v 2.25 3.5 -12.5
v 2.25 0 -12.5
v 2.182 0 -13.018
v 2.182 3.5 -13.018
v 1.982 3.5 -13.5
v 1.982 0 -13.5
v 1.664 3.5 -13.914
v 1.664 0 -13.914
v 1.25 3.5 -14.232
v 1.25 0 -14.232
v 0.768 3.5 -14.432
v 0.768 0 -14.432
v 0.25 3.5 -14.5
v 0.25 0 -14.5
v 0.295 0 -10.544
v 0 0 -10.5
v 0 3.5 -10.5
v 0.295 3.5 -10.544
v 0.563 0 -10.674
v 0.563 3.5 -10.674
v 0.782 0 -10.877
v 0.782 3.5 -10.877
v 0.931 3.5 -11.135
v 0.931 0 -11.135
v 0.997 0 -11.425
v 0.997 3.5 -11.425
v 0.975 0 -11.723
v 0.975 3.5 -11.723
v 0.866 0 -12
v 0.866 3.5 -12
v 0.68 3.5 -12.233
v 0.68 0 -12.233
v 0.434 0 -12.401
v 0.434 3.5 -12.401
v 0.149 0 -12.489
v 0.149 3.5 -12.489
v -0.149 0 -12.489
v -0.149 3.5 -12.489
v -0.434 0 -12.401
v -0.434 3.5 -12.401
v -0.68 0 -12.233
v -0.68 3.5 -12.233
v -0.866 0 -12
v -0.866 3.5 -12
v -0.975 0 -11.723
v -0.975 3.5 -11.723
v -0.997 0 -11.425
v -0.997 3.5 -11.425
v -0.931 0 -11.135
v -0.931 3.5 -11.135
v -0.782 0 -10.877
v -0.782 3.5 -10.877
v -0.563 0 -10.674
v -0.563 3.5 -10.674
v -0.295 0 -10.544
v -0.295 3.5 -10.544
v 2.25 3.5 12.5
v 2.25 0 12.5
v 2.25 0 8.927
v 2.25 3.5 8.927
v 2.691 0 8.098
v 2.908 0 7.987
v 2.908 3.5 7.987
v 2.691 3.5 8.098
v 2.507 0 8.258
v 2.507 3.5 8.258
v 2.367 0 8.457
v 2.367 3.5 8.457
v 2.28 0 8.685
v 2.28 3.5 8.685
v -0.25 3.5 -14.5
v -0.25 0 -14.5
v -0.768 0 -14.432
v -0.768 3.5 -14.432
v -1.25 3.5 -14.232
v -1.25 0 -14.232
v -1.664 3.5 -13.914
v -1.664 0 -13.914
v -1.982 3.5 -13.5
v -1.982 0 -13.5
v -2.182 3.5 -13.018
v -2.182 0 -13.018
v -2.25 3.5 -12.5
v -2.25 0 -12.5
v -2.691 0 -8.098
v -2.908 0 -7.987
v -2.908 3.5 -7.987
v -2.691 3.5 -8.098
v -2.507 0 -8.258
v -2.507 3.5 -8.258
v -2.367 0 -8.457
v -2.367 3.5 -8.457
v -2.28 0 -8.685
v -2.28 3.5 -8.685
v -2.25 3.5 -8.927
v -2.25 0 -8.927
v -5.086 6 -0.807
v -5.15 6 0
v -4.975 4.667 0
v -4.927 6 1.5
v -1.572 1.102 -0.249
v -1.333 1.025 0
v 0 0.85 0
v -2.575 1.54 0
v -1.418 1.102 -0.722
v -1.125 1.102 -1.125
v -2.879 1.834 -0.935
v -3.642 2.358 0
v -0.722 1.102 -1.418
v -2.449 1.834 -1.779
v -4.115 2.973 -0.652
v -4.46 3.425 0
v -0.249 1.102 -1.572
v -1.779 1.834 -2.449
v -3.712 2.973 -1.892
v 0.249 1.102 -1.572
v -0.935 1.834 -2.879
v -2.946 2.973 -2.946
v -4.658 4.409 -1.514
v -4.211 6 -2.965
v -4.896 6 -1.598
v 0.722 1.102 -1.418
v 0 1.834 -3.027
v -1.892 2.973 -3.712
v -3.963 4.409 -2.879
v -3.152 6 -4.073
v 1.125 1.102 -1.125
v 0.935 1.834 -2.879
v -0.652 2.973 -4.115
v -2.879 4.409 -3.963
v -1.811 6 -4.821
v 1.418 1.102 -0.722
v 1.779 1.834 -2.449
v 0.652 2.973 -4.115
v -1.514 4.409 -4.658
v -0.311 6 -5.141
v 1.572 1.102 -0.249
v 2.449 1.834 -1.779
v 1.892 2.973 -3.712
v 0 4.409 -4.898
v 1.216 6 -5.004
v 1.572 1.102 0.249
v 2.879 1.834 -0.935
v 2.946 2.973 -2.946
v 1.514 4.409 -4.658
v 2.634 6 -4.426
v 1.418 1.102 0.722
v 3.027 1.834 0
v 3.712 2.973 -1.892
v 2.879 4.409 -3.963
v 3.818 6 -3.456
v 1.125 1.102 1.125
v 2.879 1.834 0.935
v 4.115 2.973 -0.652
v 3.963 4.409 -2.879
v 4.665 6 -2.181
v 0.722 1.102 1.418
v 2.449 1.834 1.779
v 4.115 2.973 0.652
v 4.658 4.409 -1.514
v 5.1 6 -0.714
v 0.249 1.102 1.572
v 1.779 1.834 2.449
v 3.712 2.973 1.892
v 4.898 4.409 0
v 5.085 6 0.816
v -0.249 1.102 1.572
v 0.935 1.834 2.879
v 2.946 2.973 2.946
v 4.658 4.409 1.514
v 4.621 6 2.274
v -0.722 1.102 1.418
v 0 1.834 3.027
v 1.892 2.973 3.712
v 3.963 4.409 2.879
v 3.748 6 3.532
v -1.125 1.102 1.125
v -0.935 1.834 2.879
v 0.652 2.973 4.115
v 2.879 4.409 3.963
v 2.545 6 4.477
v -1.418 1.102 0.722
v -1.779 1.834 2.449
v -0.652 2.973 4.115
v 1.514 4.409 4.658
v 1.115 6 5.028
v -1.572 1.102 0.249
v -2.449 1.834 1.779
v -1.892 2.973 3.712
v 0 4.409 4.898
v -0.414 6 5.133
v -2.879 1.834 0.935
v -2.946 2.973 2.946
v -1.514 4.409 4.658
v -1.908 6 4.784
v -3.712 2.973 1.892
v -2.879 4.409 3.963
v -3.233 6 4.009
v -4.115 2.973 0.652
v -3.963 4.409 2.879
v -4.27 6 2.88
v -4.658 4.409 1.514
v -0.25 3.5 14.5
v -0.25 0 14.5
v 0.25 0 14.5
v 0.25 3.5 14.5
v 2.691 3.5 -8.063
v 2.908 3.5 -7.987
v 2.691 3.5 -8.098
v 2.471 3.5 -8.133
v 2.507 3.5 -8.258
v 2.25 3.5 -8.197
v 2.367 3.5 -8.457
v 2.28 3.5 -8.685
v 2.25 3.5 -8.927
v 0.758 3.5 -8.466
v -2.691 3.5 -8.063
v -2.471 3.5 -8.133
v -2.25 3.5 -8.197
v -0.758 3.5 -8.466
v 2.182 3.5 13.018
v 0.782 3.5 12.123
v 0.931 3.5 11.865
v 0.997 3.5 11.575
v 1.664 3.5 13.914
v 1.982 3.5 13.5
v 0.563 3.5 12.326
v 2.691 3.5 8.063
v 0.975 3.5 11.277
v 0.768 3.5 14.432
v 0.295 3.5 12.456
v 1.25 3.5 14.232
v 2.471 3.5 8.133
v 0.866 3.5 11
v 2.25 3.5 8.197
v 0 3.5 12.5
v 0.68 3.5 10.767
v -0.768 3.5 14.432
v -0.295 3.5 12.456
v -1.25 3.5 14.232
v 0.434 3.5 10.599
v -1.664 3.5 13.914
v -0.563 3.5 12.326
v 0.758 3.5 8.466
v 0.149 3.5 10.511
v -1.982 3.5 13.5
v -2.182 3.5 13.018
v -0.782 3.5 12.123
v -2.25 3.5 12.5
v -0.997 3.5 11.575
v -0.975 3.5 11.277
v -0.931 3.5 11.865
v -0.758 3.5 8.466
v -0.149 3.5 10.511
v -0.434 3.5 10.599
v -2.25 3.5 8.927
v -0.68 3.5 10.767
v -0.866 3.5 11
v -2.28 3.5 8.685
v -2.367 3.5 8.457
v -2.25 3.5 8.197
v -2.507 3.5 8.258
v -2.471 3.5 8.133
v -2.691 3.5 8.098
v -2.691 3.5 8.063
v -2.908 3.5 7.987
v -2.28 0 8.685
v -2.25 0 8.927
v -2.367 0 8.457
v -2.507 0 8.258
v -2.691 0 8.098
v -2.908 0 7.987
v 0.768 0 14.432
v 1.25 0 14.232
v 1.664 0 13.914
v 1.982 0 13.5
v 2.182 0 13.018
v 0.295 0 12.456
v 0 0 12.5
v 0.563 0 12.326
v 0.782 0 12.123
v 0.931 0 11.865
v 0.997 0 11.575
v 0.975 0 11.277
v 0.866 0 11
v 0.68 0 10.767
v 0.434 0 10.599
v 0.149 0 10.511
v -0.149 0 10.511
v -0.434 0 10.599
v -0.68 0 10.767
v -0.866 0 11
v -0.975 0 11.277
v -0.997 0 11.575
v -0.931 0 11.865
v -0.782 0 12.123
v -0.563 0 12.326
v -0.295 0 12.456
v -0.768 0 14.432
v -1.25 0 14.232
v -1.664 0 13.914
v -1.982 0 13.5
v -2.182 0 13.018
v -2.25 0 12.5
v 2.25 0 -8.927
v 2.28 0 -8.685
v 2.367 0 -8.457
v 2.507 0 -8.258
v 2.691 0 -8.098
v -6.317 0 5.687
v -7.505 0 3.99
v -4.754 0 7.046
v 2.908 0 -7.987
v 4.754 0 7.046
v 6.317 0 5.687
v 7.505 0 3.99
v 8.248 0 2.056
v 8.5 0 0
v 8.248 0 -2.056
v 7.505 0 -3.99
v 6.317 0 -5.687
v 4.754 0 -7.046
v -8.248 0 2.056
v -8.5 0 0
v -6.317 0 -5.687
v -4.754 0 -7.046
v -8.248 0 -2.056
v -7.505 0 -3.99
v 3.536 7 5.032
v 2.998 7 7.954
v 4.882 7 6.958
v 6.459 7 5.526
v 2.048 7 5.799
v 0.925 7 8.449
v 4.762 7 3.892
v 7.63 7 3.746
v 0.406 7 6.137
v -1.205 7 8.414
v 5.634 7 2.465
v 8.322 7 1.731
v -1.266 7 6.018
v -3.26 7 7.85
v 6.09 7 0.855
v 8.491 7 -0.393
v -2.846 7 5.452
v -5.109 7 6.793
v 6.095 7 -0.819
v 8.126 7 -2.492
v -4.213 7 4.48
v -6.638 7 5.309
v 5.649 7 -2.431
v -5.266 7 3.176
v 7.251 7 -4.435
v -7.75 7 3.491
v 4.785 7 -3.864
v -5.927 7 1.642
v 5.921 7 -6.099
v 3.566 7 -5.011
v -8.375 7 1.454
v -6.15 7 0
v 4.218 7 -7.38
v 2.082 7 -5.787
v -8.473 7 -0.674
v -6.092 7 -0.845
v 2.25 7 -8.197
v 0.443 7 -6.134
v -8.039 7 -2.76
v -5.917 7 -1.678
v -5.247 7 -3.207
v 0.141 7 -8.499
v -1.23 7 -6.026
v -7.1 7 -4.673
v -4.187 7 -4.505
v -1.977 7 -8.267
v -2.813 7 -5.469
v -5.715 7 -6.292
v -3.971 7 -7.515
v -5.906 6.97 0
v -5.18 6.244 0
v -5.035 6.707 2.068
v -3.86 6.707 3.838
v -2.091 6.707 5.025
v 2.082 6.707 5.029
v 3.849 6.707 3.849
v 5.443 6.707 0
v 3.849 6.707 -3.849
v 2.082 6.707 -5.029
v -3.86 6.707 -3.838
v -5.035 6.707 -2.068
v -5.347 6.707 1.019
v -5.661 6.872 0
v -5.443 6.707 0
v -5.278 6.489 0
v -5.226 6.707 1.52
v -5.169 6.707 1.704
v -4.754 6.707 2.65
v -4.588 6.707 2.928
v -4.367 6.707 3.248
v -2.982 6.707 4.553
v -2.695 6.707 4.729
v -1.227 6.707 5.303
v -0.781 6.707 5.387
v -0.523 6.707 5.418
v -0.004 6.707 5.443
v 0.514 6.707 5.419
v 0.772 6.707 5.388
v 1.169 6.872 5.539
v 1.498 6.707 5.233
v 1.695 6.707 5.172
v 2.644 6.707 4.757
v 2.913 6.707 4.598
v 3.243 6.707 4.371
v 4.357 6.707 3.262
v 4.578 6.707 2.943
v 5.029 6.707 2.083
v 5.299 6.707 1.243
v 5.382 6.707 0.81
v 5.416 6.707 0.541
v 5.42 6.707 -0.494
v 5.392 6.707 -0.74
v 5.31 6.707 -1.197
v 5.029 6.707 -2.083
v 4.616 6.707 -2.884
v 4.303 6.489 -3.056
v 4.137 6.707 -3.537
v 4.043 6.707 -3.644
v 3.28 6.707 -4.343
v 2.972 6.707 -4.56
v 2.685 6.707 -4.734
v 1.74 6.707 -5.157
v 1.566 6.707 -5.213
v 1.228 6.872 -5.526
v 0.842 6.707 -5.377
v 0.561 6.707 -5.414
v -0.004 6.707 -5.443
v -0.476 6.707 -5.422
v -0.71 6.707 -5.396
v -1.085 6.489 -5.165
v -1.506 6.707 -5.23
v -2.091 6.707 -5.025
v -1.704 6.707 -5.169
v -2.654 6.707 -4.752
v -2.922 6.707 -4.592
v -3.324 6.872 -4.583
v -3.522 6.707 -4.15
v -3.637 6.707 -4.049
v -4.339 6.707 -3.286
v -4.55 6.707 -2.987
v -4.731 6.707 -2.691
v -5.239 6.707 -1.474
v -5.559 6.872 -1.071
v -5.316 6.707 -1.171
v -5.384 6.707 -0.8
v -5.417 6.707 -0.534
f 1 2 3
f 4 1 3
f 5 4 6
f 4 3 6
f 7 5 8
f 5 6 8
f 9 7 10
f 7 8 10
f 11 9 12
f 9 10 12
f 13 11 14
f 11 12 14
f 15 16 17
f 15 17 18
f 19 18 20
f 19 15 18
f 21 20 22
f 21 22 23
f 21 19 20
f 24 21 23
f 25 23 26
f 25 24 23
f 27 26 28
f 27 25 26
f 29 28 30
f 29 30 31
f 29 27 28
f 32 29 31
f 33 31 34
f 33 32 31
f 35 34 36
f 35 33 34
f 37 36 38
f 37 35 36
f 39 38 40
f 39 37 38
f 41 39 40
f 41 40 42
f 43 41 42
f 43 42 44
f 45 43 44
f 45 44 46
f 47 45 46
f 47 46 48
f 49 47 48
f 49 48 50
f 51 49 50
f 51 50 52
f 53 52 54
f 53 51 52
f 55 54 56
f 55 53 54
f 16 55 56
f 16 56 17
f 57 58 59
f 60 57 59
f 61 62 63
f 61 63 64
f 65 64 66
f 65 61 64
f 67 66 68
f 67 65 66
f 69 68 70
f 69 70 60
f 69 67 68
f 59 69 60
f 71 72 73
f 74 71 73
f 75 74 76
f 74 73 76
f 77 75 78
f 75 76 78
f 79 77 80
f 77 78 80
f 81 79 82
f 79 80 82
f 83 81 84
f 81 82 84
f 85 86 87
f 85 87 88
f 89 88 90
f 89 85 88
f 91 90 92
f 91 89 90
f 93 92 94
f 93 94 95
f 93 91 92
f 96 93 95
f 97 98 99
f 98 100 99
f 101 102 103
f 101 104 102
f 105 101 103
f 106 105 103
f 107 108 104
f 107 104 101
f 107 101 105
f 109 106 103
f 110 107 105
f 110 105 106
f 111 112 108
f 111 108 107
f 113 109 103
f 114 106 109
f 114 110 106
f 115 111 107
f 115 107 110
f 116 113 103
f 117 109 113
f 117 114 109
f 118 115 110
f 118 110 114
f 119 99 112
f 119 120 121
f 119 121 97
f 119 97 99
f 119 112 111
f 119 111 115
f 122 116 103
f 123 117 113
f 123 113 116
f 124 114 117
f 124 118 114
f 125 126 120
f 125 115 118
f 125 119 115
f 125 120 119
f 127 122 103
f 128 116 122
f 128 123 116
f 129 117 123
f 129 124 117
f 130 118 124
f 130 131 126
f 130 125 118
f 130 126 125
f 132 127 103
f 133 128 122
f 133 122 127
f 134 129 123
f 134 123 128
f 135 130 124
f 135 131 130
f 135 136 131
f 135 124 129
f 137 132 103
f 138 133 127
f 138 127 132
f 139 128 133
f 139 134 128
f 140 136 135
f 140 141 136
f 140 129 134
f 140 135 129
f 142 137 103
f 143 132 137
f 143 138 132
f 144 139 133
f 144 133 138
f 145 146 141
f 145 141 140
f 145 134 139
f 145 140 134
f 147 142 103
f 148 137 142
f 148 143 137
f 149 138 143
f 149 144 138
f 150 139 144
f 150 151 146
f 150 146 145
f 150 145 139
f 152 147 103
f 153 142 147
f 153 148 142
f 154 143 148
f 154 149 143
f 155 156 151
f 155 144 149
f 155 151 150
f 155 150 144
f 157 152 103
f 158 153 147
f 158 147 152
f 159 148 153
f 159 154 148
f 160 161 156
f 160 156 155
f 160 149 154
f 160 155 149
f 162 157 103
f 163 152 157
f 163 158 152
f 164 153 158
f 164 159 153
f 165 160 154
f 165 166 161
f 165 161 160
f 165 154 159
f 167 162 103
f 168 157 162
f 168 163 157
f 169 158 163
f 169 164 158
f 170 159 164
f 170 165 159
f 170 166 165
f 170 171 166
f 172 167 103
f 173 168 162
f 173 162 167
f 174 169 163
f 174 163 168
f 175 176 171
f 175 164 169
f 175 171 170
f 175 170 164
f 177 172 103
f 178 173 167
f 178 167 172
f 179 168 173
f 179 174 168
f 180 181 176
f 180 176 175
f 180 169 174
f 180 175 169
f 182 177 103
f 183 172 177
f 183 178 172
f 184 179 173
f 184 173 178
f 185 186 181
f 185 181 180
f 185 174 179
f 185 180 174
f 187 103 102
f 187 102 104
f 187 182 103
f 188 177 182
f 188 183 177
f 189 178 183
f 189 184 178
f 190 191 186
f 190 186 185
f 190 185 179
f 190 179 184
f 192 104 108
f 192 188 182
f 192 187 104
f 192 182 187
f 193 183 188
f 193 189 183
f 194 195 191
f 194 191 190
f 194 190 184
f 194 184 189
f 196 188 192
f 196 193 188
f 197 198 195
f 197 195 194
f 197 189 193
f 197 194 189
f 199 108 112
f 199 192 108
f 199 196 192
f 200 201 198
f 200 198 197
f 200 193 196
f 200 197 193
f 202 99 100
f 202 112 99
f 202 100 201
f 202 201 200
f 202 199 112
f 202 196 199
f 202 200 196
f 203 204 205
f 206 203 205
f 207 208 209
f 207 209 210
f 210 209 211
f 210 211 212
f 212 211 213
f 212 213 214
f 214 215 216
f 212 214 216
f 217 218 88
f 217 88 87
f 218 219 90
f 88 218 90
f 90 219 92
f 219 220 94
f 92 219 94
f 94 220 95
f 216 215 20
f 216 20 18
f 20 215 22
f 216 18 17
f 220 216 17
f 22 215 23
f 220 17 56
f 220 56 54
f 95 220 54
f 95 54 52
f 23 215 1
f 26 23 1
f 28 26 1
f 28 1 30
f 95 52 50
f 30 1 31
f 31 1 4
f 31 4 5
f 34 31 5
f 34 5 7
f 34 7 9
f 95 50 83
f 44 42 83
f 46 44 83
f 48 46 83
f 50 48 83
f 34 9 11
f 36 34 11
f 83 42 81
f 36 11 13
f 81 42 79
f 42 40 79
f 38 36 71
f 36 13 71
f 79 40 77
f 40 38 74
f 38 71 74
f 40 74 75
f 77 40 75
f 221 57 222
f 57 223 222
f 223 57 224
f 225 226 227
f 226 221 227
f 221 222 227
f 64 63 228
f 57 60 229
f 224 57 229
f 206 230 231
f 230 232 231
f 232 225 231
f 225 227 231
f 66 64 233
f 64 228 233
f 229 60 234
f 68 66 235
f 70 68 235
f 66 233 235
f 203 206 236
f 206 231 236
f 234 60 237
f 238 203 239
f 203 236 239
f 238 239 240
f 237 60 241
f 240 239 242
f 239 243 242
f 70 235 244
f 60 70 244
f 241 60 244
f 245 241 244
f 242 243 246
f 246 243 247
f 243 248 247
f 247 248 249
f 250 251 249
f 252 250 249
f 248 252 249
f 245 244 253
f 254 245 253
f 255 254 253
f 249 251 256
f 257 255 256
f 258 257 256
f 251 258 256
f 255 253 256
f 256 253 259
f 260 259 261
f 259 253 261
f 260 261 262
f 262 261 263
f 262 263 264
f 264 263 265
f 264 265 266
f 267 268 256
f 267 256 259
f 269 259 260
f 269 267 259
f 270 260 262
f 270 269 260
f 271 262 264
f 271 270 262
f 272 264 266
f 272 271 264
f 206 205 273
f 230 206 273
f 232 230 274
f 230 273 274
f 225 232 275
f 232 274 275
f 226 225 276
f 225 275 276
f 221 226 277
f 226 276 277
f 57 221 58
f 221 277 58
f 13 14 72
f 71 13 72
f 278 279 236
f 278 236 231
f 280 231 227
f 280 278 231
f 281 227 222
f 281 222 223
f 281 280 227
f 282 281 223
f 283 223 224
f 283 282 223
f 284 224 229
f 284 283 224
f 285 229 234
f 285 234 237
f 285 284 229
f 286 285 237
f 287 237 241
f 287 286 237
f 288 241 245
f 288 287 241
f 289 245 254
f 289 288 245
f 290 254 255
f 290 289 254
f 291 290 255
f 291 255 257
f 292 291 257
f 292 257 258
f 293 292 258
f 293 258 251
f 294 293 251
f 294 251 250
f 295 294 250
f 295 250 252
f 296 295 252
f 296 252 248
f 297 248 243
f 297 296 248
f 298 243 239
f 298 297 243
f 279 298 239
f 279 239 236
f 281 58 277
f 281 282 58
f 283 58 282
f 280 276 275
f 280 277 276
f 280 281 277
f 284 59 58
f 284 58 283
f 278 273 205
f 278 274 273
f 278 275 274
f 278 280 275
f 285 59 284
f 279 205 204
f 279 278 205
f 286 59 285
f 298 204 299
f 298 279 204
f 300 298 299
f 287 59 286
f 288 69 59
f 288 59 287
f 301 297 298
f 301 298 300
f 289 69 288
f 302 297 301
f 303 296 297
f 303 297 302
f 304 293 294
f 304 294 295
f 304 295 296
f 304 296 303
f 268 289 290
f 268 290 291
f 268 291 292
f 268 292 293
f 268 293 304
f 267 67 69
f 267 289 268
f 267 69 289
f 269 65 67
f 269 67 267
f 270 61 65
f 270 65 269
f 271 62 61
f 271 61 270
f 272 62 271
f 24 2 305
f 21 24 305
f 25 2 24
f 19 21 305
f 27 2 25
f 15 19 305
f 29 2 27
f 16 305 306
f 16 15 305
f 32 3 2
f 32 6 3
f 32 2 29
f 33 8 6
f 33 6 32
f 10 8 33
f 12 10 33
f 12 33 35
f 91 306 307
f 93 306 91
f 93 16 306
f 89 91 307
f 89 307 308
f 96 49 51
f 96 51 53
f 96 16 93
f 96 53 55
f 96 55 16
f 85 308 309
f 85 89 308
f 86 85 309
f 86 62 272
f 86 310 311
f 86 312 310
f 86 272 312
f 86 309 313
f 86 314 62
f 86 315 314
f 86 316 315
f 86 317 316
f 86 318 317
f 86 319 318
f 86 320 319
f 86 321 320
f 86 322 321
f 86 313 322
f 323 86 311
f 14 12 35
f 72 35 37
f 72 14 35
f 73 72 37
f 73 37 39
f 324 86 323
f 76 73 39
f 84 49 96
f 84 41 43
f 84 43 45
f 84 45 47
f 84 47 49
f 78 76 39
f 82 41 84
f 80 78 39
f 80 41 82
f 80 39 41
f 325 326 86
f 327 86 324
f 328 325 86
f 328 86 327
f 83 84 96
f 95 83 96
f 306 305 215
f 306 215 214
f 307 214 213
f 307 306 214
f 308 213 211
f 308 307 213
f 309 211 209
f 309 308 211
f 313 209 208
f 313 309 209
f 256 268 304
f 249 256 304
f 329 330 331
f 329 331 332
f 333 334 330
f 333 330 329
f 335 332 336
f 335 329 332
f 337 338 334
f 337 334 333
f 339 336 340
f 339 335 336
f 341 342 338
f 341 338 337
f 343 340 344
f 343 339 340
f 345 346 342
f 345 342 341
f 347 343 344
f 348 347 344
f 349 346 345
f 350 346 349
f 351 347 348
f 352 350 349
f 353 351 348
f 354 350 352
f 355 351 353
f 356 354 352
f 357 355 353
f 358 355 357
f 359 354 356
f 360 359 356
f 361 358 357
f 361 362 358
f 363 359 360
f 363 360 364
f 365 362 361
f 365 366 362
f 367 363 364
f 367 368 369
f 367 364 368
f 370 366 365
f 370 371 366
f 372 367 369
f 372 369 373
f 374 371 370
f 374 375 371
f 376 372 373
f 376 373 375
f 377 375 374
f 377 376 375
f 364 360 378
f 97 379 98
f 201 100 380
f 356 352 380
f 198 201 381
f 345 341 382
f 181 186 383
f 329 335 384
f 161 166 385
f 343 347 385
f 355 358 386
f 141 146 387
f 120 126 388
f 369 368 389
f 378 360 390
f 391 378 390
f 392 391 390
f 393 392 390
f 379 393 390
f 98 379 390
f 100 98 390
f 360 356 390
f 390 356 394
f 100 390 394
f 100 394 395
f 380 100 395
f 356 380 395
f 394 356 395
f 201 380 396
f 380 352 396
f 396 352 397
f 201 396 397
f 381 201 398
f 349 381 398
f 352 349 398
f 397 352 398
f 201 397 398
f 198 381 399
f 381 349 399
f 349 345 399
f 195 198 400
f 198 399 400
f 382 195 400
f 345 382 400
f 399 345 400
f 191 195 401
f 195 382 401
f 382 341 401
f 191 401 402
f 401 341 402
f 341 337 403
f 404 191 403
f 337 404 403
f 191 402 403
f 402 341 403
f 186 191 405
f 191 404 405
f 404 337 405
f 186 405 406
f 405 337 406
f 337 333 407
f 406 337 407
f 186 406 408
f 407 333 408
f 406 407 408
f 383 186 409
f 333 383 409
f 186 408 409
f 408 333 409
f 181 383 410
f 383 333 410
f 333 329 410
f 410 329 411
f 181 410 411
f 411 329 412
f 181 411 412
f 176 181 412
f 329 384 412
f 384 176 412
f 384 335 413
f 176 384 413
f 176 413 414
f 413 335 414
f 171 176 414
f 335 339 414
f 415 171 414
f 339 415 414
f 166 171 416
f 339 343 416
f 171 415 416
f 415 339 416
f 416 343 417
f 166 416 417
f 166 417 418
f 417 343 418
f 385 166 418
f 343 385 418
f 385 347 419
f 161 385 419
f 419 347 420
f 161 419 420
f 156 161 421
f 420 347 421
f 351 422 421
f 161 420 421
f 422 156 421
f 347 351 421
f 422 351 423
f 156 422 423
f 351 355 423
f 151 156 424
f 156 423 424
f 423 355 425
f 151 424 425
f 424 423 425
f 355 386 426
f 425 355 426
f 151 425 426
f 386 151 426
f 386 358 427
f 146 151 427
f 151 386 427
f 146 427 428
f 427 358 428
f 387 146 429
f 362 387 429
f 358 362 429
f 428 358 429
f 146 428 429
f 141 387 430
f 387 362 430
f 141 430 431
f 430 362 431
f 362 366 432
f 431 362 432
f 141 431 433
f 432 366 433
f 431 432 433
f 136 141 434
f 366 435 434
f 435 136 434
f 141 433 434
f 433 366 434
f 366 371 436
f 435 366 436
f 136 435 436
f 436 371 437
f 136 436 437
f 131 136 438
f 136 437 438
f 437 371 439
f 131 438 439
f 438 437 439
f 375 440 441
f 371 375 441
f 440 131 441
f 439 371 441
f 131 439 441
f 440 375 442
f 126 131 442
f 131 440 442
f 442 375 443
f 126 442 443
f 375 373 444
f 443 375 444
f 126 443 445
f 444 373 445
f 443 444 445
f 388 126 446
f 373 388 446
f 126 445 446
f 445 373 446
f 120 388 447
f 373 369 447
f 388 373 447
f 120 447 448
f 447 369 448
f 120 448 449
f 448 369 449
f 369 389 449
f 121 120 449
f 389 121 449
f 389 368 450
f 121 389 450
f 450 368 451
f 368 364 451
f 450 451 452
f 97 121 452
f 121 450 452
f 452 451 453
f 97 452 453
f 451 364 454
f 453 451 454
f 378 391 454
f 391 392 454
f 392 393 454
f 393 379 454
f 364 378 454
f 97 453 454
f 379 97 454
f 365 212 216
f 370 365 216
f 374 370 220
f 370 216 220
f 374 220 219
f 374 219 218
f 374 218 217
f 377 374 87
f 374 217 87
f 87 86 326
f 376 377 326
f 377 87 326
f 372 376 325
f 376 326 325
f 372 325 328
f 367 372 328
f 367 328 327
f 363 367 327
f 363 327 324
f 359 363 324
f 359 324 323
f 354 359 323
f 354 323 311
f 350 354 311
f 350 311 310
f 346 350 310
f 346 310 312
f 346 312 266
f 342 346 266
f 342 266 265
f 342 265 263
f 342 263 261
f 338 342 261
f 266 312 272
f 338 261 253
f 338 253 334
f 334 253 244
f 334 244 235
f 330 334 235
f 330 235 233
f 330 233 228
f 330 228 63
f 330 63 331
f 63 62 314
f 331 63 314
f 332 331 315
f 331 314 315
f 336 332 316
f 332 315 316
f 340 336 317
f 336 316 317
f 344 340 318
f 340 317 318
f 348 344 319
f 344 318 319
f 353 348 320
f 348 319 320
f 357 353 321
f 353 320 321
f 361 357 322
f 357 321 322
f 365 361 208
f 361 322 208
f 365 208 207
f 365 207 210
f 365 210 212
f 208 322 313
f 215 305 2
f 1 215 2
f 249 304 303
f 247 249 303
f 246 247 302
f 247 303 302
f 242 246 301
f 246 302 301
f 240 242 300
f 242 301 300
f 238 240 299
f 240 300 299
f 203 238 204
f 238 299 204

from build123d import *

# Parameters (mm, degrees)
CROQUIS1_R              = 1
CROQUIS1_R_2            = 8.5
SALIENTE_EXTRUIR1_DEPTH = 3.5
CROQUIS1_3_R            = 8.5
SALIENTE_EXTRUIR2_DEPTH = 7
REDONDEO1_R             = 1
REDONDEO3_R             = 1


with BuildPart() as part:
    # Croquis1 → Saliente-Extruir1 (new body)
    # profile 1 of 3: a face of its own
    with BuildSketch(Plane(origin=(0, 0, 0), x_dir=(1, 0, 0), z_dir=(0, 1, 0))):
        with BuildLine():
            Line((-2.25, 12.5), (-2.25, 8.196798155))
            ThreePointArc((-2.25, 8.196798155), (0, 8.5), (2.25, 8.196798155))
            Line((2.25, 8.196798155), (2.25, 12.5))
            ThreePointArc((2.25, 12.5), (1.664213562, 13.914213562), (0.25, 14.5))
            Line((0.25, 14.5), (-0.25, 14.5))
            ThreePointArc((-0.25, 14.5), (-1.664213562, 13.914213562), (-2.25, 12.5))
        make_face()
        with Locations(Location((0, 11.5, 0), (0, 0, 270))):
            Circle(CROQUIS1_R, mode=Mode.SUBTRACT)
    # profile 2 of 3: a face of its own
    with BuildSketch(Plane(origin=(0, 0, 0), x_dir=(1, 0, 0), z_dir=(0, 1, 0))):
        Circle(CROQUIS1_R_2)
    # profile 3 of 3: a face of its own
    with BuildSketch(Plane(origin=(0, 0, 0), x_dir=(1, 0, 0), z_dir=(0, 1, 0))):
        with BuildLine():
            ThreePointArc((2.25, -8.196798155), (0, -8.5), (-2.25, -8.196798155))
            Line((-2.25, -8.196798155), (-2.25, -12.5))
            ThreePointArc((-2.25, -12.5), (-1.664213562, -13.914213562), (-0.25, -14.5))
            Line((-0.25, -14.5), (0.25, -14.5))
            ThreePointArc((0.25, -14.5), (1.664213562, -13.914213562), (2.25, -12.5))
            Line((2.25, -12.5), (2.25, -8.196798155))
        make_face()
        with Locations(Location((0, -11.5, 0), (0, 0, 270))):
            Circle(CROQUIS1_R, mode=Mode.SUBTRACT)
    extrude(amount=SALIENTE_EXTRUIR1_DEPTH)

    # Croquis1<3> → Saliente-Extruir2 (add)
    with BuildSketch(Plane(origin=(0, 0, 0), x_dir=(1, 0, 0), z_dir=(0, 1, 0))):
        with Locations(Location((0, 0, 0), (0, 0, 74.650522983))):
            Circle(CROQUIS1_3_R)
    extrude(amount=SALIENTE_EXTRUIR2_DEPTH)

    # Redondeo1
    # the kernel refuses this fillet: 1 mm, written as the material it adds along each edge
    with BuildSketch(Plane(origin=(2.25, 0, -8.196798155), x_dir=(0.9527816834401653, 0, 0.3036561603210522), z_dir=(0, 1, 0)), Plane(origin=(-2.25, 0, 8.196798155), x_dir=(-0.9527816834401646, 0, -0.3036561603210549), z_dir=(0, 1, 0))) as redondeo1_piece_1:
        with BuildLine():
            CenterArc((0.731116518, 0.999174765), REDONDEO1_R, 197.677333553, 69.994809912)
            Line((-0.221665165, 0.695518605), (0, 0))
            ThreePointArc((0, 0), (0.345249467, 0.007014494), (0.690498934, 0))
        make_face()
    extrude(amount=3.5)
    with BuildSketch(Plane(origin=(2.25, 0, 8.196798155), x_dir=(0.9527816834401651, 0, -0.3036561603210529), z_dir=(0, 1, 0)), Plane(origin=(-2.25, 0, -8.196798155), x_dir=(-0.9527816834401648, 0, 0.30365616032105397), z_dir=(0, 1, 0))) as redondeo1_piece_2:
        with BuildLine():
            CenterArc((0.731116518, -0.999174765), REDONDEO1_R, 92.327856536, 69.994809912)
            Line((-0.221665165, -0.695518605), (0, 0))
            ThreePointArc((0, 0), (0.345249467, -0.007014494), (0.690498934, 0))
        make_face()
    extrude(amount=3.5)

    # Croquis2 → Cortar-Revolución1 (revolve, cut)
    with BuildSketch(Plane.XY):
        with BuildLine():
            Line((0, 11.15), (0, 0.85))
            ThreePointArc((0, 0.85), (-5.15, 6), (0, 11.15))
        make_face()
    revolve(axis=Axis((0, 11.15, 0), (0, -1, 0)), mode=Mode.SUBTRACT)

    # Redondeo3
    redondeo3_edges = [part.edges().sort_by_distance(p)[0] for p in [
        (5.05197981, 7, 0),
    ]]
    fillet(redondeo3_edges, radius=REDONDEO3_R)


solid = part.part
